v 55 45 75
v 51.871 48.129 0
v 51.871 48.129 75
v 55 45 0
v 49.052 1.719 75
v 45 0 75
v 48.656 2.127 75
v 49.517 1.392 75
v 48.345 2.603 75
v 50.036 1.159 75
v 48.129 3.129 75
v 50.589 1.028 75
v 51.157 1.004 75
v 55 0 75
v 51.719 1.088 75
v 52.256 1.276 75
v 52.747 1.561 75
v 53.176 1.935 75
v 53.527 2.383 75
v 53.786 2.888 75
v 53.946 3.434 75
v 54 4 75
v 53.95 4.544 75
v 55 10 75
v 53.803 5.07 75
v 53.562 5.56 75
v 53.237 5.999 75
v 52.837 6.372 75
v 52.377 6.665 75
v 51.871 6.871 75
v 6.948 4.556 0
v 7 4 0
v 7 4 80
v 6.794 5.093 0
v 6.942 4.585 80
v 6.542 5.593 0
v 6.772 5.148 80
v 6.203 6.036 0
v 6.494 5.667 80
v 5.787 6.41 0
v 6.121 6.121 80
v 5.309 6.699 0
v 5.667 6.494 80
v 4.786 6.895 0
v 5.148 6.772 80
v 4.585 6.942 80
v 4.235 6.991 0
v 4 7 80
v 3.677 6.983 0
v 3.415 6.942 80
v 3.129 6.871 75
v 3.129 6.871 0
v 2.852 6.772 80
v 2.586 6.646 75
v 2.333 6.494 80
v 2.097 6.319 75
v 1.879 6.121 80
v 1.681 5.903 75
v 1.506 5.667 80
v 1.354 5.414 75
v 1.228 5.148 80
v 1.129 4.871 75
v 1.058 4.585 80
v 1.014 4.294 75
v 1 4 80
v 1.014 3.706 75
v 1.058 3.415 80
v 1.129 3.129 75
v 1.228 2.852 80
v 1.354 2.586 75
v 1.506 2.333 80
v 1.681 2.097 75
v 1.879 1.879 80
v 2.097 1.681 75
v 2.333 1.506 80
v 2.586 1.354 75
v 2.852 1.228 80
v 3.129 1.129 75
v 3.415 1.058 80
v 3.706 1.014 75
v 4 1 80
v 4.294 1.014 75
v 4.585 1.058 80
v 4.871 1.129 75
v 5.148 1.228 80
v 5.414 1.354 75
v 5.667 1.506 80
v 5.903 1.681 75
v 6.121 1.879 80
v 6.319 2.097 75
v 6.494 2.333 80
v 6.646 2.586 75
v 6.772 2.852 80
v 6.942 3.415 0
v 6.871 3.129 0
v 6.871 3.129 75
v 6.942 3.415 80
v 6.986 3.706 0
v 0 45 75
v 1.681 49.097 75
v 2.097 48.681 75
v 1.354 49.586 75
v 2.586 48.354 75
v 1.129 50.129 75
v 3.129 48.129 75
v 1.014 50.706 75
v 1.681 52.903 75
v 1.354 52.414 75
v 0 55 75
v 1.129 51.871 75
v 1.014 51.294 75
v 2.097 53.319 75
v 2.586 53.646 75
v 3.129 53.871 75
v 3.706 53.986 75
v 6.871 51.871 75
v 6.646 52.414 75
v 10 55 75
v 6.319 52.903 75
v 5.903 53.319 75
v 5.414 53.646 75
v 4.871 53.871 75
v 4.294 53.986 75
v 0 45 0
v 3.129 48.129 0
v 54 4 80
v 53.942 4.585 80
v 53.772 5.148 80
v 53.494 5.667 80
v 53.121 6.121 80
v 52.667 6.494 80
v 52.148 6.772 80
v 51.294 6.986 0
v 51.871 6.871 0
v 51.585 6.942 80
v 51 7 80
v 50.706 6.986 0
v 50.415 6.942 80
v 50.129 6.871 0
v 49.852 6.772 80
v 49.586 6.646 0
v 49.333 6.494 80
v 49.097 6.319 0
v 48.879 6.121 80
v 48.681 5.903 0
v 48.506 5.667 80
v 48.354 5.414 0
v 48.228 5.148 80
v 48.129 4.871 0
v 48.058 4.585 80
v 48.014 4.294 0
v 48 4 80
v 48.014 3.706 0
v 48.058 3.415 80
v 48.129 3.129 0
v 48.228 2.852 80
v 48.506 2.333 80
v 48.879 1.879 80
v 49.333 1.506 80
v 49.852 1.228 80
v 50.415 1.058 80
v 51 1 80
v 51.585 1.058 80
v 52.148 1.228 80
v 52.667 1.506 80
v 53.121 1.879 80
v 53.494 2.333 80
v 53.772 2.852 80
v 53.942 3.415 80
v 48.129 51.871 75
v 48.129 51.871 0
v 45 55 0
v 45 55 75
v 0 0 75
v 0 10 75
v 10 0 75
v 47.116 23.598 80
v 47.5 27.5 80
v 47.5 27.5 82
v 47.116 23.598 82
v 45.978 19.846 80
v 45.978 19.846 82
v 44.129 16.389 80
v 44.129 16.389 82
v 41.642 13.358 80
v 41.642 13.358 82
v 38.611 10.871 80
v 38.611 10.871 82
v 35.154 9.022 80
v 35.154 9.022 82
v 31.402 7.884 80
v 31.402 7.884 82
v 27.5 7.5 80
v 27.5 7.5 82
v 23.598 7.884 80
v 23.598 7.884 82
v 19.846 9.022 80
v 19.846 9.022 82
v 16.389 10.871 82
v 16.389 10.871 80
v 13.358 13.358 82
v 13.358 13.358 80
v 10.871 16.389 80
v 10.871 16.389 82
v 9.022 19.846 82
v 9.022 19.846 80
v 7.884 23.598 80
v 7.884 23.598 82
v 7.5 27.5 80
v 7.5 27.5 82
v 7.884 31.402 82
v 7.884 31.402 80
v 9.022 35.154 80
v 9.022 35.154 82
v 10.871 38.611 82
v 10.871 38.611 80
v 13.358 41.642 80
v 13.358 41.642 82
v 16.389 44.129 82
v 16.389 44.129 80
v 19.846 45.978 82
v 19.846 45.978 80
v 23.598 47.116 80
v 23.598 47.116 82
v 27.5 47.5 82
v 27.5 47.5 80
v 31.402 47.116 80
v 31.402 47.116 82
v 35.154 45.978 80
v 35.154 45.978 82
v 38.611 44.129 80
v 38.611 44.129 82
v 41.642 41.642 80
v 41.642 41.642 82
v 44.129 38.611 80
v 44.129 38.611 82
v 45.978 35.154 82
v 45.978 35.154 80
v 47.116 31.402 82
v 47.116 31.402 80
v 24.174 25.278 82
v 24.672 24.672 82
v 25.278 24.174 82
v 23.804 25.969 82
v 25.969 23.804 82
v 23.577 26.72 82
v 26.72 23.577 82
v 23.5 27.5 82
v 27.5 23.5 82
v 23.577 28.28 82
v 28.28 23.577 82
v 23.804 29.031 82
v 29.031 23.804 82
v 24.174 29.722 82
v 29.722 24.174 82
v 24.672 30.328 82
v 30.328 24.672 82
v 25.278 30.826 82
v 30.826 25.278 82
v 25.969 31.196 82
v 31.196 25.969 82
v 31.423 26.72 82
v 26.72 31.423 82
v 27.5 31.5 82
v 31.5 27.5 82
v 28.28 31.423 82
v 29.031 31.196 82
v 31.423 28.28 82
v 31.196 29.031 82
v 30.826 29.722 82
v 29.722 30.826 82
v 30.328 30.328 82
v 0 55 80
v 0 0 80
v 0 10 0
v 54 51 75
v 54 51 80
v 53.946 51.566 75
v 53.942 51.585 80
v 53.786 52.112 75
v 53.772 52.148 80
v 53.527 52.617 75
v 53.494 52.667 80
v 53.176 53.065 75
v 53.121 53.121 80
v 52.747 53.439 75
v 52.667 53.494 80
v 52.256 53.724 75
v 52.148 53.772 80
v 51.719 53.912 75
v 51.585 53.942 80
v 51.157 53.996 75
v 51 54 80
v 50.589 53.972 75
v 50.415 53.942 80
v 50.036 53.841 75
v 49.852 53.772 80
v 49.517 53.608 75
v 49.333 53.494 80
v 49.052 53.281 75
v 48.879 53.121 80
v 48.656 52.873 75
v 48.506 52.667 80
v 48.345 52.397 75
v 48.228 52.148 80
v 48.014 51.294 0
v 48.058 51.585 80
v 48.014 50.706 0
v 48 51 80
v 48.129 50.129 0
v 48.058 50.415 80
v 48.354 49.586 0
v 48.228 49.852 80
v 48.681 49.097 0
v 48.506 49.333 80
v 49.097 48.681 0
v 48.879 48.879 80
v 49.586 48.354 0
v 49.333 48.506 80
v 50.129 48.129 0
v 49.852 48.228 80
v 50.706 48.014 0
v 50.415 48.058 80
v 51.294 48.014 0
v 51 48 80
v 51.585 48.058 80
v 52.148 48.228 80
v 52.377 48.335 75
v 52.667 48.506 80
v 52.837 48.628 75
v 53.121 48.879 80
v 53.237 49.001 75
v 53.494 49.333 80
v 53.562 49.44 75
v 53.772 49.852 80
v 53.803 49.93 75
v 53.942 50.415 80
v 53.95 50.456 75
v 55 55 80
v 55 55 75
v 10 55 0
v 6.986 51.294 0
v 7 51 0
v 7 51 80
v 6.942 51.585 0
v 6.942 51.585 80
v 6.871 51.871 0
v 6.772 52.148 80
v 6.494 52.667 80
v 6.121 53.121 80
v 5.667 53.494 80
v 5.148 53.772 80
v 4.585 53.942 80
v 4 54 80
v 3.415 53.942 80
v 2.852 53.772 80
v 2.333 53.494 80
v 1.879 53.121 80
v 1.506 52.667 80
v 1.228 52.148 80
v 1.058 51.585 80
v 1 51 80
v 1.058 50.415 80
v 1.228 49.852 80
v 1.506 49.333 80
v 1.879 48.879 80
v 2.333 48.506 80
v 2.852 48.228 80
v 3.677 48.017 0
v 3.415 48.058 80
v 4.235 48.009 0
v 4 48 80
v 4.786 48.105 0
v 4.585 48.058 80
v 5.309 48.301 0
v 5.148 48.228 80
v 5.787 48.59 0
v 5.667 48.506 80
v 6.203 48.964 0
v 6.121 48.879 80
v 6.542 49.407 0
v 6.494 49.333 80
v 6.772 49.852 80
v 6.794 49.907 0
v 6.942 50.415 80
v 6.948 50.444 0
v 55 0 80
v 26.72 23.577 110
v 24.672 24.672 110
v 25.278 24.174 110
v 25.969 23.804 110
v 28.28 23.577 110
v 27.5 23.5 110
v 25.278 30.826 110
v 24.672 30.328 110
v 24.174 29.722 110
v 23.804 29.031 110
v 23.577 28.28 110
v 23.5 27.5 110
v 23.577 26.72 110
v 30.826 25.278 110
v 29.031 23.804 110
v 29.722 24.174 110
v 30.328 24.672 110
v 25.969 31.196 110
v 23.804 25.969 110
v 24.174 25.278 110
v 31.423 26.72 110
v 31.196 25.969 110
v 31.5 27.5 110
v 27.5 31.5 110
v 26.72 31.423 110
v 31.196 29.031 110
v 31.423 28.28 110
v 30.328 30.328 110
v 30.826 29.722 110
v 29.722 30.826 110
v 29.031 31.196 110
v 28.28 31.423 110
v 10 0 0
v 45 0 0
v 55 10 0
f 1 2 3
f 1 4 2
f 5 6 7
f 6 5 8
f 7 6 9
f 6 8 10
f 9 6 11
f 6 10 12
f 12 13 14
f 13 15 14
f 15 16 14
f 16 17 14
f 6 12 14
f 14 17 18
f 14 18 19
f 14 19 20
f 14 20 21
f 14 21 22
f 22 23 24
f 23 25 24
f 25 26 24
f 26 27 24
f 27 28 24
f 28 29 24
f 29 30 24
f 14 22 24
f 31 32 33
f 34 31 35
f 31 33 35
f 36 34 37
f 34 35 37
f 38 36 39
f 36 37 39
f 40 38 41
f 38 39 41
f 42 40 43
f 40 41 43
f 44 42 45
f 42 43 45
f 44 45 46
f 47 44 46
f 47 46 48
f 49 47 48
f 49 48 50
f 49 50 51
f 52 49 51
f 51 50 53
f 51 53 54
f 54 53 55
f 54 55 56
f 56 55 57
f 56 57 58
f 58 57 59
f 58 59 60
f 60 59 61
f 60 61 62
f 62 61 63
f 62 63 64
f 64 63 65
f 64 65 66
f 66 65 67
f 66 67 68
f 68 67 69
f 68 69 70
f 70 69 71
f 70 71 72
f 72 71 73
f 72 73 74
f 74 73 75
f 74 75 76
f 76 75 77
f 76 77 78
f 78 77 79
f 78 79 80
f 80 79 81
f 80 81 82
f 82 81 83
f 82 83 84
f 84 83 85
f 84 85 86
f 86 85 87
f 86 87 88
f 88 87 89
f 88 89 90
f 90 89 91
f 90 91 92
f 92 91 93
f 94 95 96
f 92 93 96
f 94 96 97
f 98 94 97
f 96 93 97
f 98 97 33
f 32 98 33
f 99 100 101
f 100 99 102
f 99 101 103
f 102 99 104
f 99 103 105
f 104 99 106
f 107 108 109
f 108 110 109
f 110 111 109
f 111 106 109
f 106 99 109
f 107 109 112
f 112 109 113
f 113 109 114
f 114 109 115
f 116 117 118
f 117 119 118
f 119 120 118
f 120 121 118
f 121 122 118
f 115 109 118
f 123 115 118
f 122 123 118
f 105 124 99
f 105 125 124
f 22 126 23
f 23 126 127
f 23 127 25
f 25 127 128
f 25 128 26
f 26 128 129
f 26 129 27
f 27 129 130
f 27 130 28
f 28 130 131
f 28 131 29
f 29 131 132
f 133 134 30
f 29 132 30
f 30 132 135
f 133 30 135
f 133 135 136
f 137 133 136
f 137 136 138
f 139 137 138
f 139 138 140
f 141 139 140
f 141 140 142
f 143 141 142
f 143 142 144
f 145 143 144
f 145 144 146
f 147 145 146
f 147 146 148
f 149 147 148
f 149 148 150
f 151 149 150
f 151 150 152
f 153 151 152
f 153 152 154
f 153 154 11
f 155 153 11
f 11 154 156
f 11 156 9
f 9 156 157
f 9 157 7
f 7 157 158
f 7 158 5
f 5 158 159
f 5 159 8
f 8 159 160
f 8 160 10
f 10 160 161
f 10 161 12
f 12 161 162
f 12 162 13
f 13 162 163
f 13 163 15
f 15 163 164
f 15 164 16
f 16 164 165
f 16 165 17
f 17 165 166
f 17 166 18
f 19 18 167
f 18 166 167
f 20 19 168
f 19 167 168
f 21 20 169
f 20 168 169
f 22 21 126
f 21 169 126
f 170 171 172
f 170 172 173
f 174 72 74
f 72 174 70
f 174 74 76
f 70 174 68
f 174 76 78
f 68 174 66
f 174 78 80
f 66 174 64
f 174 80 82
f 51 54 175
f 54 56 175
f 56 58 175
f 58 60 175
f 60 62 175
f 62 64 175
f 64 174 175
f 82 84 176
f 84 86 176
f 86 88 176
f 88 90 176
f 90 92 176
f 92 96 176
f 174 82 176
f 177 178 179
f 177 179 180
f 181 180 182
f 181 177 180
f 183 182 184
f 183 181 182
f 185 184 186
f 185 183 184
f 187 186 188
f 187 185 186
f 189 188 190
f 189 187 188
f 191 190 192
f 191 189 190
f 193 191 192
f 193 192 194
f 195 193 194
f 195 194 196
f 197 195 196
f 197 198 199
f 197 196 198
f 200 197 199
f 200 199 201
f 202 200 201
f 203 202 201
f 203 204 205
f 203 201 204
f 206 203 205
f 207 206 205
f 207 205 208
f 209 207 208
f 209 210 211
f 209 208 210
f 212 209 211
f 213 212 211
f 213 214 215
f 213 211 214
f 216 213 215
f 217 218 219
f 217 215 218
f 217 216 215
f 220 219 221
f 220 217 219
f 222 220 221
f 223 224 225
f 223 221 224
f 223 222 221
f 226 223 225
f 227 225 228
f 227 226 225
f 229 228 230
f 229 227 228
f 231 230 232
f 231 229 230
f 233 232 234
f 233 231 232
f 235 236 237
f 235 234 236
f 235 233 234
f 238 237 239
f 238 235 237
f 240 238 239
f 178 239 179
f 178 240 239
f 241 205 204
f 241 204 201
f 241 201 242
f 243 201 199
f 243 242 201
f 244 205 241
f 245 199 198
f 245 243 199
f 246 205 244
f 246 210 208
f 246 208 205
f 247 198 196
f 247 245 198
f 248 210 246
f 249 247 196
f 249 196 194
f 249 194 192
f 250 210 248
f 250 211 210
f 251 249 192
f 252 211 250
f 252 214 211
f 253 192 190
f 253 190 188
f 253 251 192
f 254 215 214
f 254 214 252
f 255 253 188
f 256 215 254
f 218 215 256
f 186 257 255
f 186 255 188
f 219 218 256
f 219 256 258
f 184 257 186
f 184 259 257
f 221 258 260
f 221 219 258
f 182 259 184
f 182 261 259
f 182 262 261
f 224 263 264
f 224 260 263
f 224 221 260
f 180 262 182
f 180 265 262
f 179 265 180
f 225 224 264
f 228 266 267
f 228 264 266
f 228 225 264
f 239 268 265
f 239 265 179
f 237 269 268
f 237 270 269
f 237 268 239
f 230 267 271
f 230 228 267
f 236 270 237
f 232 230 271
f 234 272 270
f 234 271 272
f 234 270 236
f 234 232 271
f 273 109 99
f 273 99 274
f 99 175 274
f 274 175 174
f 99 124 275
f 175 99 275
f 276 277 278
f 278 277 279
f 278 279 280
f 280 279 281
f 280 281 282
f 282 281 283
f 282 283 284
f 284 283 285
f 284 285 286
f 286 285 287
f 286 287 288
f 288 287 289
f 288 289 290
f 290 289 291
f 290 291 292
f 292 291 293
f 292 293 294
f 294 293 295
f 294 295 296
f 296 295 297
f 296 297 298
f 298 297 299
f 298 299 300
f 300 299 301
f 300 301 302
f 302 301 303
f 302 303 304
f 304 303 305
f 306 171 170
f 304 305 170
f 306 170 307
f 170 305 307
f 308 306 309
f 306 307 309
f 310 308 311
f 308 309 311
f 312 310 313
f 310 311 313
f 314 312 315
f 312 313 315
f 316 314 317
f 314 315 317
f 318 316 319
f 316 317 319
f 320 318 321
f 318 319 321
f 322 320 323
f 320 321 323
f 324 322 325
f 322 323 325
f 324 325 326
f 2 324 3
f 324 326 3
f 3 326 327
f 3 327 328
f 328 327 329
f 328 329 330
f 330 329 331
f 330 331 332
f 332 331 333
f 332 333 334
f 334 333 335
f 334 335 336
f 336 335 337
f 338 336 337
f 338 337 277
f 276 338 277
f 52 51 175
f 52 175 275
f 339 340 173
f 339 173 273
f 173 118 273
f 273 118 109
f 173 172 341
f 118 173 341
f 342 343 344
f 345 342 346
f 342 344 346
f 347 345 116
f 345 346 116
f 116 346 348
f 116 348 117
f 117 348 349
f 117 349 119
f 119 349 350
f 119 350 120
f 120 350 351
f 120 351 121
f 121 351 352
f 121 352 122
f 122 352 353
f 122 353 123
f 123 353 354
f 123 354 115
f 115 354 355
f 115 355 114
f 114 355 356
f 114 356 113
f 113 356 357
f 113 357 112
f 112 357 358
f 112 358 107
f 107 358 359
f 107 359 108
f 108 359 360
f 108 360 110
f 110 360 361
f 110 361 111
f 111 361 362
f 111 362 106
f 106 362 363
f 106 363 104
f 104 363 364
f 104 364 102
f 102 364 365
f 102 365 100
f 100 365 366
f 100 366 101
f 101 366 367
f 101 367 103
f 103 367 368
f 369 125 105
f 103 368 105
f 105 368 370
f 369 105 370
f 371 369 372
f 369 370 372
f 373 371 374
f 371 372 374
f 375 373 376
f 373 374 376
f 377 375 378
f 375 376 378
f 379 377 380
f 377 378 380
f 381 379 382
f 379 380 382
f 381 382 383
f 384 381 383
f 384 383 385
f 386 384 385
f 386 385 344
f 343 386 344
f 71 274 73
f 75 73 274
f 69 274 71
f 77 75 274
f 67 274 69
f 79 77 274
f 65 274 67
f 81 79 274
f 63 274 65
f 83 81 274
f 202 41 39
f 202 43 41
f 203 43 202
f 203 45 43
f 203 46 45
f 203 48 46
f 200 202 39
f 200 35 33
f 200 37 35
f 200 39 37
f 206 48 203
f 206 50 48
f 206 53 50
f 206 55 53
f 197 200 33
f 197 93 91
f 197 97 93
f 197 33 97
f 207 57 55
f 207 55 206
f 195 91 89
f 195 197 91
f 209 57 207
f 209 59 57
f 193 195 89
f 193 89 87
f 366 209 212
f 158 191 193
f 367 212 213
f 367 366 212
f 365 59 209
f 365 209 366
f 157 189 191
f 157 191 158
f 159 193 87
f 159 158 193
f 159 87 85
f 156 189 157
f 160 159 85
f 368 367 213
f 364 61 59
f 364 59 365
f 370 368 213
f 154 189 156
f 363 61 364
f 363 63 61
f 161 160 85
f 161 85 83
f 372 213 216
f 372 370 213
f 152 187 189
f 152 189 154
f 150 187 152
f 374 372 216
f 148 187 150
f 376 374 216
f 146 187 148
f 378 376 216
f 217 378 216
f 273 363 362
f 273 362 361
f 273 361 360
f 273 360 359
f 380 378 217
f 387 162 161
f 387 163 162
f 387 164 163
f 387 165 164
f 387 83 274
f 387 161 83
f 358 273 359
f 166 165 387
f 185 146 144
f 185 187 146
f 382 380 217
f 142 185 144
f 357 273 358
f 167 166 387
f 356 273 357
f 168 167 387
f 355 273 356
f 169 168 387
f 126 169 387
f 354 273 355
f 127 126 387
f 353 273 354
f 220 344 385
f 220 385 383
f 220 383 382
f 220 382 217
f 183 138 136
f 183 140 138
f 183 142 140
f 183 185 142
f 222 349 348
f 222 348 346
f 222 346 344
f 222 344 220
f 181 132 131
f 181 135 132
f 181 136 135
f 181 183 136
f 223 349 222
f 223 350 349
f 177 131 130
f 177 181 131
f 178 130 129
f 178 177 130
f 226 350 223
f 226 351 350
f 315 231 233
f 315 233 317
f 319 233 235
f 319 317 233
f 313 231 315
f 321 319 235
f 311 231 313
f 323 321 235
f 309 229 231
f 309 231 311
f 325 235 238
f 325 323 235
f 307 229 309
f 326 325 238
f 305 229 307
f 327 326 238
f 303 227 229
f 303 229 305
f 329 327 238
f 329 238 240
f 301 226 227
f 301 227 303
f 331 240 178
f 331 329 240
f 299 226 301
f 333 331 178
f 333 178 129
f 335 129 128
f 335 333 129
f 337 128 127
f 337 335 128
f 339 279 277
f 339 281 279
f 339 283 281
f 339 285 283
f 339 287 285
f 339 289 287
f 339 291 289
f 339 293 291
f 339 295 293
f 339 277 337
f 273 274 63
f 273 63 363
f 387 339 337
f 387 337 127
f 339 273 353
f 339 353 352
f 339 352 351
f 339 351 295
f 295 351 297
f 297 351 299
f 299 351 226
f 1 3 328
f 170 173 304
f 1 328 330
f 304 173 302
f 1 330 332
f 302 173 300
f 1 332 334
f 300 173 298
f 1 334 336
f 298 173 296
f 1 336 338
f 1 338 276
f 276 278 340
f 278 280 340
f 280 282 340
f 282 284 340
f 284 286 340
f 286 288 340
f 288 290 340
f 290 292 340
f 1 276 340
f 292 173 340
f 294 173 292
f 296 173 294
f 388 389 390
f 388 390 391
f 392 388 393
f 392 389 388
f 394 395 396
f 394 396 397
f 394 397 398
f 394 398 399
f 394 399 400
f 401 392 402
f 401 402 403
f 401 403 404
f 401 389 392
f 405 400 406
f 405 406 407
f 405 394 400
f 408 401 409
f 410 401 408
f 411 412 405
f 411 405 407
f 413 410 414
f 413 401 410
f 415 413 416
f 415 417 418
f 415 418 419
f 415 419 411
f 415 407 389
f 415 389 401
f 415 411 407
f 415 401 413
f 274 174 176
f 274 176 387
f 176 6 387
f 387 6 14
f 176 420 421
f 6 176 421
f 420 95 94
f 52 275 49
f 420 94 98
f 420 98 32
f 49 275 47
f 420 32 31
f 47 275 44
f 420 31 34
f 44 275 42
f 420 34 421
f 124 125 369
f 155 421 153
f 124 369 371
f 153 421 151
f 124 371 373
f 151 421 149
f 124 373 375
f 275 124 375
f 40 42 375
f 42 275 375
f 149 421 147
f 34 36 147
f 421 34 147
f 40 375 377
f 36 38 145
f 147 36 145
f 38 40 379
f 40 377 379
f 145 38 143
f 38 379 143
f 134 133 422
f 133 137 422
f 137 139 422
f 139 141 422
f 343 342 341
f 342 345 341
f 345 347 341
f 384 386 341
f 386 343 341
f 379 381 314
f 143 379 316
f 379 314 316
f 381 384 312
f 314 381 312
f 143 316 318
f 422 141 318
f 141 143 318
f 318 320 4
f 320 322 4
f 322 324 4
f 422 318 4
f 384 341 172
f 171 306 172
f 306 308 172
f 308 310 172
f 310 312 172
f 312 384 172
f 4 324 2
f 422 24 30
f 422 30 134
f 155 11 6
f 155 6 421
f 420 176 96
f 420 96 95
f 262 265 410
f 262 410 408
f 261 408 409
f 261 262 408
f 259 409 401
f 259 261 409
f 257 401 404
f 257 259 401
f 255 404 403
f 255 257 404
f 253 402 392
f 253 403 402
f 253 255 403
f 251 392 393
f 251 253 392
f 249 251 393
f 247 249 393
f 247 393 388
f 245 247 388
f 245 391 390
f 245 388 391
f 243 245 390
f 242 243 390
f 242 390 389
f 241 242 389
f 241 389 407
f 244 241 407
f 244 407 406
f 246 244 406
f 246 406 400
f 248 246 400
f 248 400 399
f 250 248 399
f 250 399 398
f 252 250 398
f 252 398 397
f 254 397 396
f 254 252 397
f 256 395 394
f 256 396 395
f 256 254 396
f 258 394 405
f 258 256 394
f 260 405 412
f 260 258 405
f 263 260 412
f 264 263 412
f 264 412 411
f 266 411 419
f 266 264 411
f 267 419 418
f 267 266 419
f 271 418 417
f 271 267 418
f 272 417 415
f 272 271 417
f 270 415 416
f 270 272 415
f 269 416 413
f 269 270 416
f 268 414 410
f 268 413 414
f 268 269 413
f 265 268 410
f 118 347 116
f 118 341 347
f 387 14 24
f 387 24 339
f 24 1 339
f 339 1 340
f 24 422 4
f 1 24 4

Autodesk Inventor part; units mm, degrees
ref_plane "YZ Plane" through (0, 0, 0) normal (1, 0, 0) x (0, 1, 0)
ref_plane "XZ Plane" through (0, 0, 0) normal (0, 1, 0) x (-1, 0, 0)
ref_plane "XY Plane" through (0, 0, 0) normal (0, 0, 1) x (1, 0, 0)
sketch "Sketch1" plane through (0, 0, 0) normal (0, 0, 1) x (1, 0, 0)
  line L0 (0, 0) -> (55, 0)
  line L1 (55, 0) -> (55, 55)
  line L2 (55, 55) -> (0, 55)
  line L3 (0, 55) -> (0, 0)
  dimension "d0" = 55
  dimension "d1" = 55
extrude "Extrusion1" add sketch "Sketch1" along normal blind 80
sketch "Sketch2" plane through (0, 0, 80) normal (0, 0, 1) x (1, 0, 0)
  line L0 (55, 0) -> (55, 55) projected
  line L1 (55, 55) -> (0, 55) projected
  line L2 (0, 55) -> (0, 0) projected
  line L3 (0, 0) -> (55, 0) projected
  circle A0 centre (27.5, 27.5) radius 20
  circle A1 centre (27.5, 27.5) radius 4
  dimension "d7" = 27.5
  dimension "d8" = 27.5
  dimension "d9" = 40
  dimension "d10" = 8
extrude "Extrusion2" add sketch "Sketch2" along normal blind 2 contours A0
sketch "Sketch3" plane through (27.5, 27.5, 80) normal (0, 0, 1) x (1, 0, 0)
  circle A0 centre (0, 0) radius 4 projected
  point P0 (-27.5, -27.5)
extrude "Extrusion3" add sketch "Sketch3" along normal blind 30
chamfer "Chamfer1" distance 10 angle 45 4 edges at (0, 55, 40) (0, 0, 40) (55, 0, 40) (55, 55, 40)
sketch "Sketch4" plane through (0, 0, 80) normal (0, 0, 1) x (1, 0, 0)
  line L0 (45, 55) -> (55, 45) projected
  line L1 (45, 55) -> (10, 55) projected
  line L2 (0, 45) -> (10, 55) projected
  line L3 (0, 45) -> (0, 10) projected
  line L4 (10, 0) -> (0, 10) projected
  line L5 (10, 0) -> (45, 0) projected
  line L6 (55, 10) -> (45, 0) projected
  line L7 (55, 10) -> (55, 45) projected
  circle A0 centre (27.5, 27.5) radius 20 projected
  line L8 (10, 55) -> (0, 55)
  line L9 (0, 55) -> (0, 45)
  line L10 (0, 10) -> (0, 0)
  line L11 (0, 0) -> (10, 0)
  line L12 (45, 0) -> (55, 0)
  line L13 (55, 0) -> (55, 10)
  line L14 (55, 45) -> (55, 55)
  line L15 (45, 55) -> (55, 55)
extrude "Extrusion4" add sketch "Sketch4" against normal blind 5 contours L15 L14 L0 | L2 L9 L8 | L13 L12 L6 | L4 L11 L10
sketch "Sketch5" plane through (0, 0, 80) normal (0, 0, 1) x (1, 0, 0)
  line L0 (0, 45) -> (10, 55) projected
  circle A0 centre (4, 51) radius 3
  line L1 (55, 55) -> (0, 55) projected
  line L2 (0, 55) -> (0, 0) projected
  circle A1 centre (4, 4) radius 3
  circle A2 centre (51, 4) radius 3
  circle A3 centre (51, 51) radius 3
  line L3 (0, 0) -> (55, 0) projected
  line L4 (55, 0) -> (55, 55) projected
  dimension "d20" = 4
  dimension "d21" = 4
  dimension "d22" = 6
  dimension "d23" = 4
  dimension "d24" = 4
  dimension "d25" = 4
  dimension "d26" = 4
  dimension "d27" = 4
  dimension "d28" = 4
extrude "Extrusion5" cut sketch "Sketch5" against normal through all contours A0 L0 | L0 A0 | A1 | A2 | A3
equation "\"d7\" = 0.5 * d1"
equation "\"d8\" = 0.5 * d0"
properties part number "stepper motor base" material "Aluminum"
